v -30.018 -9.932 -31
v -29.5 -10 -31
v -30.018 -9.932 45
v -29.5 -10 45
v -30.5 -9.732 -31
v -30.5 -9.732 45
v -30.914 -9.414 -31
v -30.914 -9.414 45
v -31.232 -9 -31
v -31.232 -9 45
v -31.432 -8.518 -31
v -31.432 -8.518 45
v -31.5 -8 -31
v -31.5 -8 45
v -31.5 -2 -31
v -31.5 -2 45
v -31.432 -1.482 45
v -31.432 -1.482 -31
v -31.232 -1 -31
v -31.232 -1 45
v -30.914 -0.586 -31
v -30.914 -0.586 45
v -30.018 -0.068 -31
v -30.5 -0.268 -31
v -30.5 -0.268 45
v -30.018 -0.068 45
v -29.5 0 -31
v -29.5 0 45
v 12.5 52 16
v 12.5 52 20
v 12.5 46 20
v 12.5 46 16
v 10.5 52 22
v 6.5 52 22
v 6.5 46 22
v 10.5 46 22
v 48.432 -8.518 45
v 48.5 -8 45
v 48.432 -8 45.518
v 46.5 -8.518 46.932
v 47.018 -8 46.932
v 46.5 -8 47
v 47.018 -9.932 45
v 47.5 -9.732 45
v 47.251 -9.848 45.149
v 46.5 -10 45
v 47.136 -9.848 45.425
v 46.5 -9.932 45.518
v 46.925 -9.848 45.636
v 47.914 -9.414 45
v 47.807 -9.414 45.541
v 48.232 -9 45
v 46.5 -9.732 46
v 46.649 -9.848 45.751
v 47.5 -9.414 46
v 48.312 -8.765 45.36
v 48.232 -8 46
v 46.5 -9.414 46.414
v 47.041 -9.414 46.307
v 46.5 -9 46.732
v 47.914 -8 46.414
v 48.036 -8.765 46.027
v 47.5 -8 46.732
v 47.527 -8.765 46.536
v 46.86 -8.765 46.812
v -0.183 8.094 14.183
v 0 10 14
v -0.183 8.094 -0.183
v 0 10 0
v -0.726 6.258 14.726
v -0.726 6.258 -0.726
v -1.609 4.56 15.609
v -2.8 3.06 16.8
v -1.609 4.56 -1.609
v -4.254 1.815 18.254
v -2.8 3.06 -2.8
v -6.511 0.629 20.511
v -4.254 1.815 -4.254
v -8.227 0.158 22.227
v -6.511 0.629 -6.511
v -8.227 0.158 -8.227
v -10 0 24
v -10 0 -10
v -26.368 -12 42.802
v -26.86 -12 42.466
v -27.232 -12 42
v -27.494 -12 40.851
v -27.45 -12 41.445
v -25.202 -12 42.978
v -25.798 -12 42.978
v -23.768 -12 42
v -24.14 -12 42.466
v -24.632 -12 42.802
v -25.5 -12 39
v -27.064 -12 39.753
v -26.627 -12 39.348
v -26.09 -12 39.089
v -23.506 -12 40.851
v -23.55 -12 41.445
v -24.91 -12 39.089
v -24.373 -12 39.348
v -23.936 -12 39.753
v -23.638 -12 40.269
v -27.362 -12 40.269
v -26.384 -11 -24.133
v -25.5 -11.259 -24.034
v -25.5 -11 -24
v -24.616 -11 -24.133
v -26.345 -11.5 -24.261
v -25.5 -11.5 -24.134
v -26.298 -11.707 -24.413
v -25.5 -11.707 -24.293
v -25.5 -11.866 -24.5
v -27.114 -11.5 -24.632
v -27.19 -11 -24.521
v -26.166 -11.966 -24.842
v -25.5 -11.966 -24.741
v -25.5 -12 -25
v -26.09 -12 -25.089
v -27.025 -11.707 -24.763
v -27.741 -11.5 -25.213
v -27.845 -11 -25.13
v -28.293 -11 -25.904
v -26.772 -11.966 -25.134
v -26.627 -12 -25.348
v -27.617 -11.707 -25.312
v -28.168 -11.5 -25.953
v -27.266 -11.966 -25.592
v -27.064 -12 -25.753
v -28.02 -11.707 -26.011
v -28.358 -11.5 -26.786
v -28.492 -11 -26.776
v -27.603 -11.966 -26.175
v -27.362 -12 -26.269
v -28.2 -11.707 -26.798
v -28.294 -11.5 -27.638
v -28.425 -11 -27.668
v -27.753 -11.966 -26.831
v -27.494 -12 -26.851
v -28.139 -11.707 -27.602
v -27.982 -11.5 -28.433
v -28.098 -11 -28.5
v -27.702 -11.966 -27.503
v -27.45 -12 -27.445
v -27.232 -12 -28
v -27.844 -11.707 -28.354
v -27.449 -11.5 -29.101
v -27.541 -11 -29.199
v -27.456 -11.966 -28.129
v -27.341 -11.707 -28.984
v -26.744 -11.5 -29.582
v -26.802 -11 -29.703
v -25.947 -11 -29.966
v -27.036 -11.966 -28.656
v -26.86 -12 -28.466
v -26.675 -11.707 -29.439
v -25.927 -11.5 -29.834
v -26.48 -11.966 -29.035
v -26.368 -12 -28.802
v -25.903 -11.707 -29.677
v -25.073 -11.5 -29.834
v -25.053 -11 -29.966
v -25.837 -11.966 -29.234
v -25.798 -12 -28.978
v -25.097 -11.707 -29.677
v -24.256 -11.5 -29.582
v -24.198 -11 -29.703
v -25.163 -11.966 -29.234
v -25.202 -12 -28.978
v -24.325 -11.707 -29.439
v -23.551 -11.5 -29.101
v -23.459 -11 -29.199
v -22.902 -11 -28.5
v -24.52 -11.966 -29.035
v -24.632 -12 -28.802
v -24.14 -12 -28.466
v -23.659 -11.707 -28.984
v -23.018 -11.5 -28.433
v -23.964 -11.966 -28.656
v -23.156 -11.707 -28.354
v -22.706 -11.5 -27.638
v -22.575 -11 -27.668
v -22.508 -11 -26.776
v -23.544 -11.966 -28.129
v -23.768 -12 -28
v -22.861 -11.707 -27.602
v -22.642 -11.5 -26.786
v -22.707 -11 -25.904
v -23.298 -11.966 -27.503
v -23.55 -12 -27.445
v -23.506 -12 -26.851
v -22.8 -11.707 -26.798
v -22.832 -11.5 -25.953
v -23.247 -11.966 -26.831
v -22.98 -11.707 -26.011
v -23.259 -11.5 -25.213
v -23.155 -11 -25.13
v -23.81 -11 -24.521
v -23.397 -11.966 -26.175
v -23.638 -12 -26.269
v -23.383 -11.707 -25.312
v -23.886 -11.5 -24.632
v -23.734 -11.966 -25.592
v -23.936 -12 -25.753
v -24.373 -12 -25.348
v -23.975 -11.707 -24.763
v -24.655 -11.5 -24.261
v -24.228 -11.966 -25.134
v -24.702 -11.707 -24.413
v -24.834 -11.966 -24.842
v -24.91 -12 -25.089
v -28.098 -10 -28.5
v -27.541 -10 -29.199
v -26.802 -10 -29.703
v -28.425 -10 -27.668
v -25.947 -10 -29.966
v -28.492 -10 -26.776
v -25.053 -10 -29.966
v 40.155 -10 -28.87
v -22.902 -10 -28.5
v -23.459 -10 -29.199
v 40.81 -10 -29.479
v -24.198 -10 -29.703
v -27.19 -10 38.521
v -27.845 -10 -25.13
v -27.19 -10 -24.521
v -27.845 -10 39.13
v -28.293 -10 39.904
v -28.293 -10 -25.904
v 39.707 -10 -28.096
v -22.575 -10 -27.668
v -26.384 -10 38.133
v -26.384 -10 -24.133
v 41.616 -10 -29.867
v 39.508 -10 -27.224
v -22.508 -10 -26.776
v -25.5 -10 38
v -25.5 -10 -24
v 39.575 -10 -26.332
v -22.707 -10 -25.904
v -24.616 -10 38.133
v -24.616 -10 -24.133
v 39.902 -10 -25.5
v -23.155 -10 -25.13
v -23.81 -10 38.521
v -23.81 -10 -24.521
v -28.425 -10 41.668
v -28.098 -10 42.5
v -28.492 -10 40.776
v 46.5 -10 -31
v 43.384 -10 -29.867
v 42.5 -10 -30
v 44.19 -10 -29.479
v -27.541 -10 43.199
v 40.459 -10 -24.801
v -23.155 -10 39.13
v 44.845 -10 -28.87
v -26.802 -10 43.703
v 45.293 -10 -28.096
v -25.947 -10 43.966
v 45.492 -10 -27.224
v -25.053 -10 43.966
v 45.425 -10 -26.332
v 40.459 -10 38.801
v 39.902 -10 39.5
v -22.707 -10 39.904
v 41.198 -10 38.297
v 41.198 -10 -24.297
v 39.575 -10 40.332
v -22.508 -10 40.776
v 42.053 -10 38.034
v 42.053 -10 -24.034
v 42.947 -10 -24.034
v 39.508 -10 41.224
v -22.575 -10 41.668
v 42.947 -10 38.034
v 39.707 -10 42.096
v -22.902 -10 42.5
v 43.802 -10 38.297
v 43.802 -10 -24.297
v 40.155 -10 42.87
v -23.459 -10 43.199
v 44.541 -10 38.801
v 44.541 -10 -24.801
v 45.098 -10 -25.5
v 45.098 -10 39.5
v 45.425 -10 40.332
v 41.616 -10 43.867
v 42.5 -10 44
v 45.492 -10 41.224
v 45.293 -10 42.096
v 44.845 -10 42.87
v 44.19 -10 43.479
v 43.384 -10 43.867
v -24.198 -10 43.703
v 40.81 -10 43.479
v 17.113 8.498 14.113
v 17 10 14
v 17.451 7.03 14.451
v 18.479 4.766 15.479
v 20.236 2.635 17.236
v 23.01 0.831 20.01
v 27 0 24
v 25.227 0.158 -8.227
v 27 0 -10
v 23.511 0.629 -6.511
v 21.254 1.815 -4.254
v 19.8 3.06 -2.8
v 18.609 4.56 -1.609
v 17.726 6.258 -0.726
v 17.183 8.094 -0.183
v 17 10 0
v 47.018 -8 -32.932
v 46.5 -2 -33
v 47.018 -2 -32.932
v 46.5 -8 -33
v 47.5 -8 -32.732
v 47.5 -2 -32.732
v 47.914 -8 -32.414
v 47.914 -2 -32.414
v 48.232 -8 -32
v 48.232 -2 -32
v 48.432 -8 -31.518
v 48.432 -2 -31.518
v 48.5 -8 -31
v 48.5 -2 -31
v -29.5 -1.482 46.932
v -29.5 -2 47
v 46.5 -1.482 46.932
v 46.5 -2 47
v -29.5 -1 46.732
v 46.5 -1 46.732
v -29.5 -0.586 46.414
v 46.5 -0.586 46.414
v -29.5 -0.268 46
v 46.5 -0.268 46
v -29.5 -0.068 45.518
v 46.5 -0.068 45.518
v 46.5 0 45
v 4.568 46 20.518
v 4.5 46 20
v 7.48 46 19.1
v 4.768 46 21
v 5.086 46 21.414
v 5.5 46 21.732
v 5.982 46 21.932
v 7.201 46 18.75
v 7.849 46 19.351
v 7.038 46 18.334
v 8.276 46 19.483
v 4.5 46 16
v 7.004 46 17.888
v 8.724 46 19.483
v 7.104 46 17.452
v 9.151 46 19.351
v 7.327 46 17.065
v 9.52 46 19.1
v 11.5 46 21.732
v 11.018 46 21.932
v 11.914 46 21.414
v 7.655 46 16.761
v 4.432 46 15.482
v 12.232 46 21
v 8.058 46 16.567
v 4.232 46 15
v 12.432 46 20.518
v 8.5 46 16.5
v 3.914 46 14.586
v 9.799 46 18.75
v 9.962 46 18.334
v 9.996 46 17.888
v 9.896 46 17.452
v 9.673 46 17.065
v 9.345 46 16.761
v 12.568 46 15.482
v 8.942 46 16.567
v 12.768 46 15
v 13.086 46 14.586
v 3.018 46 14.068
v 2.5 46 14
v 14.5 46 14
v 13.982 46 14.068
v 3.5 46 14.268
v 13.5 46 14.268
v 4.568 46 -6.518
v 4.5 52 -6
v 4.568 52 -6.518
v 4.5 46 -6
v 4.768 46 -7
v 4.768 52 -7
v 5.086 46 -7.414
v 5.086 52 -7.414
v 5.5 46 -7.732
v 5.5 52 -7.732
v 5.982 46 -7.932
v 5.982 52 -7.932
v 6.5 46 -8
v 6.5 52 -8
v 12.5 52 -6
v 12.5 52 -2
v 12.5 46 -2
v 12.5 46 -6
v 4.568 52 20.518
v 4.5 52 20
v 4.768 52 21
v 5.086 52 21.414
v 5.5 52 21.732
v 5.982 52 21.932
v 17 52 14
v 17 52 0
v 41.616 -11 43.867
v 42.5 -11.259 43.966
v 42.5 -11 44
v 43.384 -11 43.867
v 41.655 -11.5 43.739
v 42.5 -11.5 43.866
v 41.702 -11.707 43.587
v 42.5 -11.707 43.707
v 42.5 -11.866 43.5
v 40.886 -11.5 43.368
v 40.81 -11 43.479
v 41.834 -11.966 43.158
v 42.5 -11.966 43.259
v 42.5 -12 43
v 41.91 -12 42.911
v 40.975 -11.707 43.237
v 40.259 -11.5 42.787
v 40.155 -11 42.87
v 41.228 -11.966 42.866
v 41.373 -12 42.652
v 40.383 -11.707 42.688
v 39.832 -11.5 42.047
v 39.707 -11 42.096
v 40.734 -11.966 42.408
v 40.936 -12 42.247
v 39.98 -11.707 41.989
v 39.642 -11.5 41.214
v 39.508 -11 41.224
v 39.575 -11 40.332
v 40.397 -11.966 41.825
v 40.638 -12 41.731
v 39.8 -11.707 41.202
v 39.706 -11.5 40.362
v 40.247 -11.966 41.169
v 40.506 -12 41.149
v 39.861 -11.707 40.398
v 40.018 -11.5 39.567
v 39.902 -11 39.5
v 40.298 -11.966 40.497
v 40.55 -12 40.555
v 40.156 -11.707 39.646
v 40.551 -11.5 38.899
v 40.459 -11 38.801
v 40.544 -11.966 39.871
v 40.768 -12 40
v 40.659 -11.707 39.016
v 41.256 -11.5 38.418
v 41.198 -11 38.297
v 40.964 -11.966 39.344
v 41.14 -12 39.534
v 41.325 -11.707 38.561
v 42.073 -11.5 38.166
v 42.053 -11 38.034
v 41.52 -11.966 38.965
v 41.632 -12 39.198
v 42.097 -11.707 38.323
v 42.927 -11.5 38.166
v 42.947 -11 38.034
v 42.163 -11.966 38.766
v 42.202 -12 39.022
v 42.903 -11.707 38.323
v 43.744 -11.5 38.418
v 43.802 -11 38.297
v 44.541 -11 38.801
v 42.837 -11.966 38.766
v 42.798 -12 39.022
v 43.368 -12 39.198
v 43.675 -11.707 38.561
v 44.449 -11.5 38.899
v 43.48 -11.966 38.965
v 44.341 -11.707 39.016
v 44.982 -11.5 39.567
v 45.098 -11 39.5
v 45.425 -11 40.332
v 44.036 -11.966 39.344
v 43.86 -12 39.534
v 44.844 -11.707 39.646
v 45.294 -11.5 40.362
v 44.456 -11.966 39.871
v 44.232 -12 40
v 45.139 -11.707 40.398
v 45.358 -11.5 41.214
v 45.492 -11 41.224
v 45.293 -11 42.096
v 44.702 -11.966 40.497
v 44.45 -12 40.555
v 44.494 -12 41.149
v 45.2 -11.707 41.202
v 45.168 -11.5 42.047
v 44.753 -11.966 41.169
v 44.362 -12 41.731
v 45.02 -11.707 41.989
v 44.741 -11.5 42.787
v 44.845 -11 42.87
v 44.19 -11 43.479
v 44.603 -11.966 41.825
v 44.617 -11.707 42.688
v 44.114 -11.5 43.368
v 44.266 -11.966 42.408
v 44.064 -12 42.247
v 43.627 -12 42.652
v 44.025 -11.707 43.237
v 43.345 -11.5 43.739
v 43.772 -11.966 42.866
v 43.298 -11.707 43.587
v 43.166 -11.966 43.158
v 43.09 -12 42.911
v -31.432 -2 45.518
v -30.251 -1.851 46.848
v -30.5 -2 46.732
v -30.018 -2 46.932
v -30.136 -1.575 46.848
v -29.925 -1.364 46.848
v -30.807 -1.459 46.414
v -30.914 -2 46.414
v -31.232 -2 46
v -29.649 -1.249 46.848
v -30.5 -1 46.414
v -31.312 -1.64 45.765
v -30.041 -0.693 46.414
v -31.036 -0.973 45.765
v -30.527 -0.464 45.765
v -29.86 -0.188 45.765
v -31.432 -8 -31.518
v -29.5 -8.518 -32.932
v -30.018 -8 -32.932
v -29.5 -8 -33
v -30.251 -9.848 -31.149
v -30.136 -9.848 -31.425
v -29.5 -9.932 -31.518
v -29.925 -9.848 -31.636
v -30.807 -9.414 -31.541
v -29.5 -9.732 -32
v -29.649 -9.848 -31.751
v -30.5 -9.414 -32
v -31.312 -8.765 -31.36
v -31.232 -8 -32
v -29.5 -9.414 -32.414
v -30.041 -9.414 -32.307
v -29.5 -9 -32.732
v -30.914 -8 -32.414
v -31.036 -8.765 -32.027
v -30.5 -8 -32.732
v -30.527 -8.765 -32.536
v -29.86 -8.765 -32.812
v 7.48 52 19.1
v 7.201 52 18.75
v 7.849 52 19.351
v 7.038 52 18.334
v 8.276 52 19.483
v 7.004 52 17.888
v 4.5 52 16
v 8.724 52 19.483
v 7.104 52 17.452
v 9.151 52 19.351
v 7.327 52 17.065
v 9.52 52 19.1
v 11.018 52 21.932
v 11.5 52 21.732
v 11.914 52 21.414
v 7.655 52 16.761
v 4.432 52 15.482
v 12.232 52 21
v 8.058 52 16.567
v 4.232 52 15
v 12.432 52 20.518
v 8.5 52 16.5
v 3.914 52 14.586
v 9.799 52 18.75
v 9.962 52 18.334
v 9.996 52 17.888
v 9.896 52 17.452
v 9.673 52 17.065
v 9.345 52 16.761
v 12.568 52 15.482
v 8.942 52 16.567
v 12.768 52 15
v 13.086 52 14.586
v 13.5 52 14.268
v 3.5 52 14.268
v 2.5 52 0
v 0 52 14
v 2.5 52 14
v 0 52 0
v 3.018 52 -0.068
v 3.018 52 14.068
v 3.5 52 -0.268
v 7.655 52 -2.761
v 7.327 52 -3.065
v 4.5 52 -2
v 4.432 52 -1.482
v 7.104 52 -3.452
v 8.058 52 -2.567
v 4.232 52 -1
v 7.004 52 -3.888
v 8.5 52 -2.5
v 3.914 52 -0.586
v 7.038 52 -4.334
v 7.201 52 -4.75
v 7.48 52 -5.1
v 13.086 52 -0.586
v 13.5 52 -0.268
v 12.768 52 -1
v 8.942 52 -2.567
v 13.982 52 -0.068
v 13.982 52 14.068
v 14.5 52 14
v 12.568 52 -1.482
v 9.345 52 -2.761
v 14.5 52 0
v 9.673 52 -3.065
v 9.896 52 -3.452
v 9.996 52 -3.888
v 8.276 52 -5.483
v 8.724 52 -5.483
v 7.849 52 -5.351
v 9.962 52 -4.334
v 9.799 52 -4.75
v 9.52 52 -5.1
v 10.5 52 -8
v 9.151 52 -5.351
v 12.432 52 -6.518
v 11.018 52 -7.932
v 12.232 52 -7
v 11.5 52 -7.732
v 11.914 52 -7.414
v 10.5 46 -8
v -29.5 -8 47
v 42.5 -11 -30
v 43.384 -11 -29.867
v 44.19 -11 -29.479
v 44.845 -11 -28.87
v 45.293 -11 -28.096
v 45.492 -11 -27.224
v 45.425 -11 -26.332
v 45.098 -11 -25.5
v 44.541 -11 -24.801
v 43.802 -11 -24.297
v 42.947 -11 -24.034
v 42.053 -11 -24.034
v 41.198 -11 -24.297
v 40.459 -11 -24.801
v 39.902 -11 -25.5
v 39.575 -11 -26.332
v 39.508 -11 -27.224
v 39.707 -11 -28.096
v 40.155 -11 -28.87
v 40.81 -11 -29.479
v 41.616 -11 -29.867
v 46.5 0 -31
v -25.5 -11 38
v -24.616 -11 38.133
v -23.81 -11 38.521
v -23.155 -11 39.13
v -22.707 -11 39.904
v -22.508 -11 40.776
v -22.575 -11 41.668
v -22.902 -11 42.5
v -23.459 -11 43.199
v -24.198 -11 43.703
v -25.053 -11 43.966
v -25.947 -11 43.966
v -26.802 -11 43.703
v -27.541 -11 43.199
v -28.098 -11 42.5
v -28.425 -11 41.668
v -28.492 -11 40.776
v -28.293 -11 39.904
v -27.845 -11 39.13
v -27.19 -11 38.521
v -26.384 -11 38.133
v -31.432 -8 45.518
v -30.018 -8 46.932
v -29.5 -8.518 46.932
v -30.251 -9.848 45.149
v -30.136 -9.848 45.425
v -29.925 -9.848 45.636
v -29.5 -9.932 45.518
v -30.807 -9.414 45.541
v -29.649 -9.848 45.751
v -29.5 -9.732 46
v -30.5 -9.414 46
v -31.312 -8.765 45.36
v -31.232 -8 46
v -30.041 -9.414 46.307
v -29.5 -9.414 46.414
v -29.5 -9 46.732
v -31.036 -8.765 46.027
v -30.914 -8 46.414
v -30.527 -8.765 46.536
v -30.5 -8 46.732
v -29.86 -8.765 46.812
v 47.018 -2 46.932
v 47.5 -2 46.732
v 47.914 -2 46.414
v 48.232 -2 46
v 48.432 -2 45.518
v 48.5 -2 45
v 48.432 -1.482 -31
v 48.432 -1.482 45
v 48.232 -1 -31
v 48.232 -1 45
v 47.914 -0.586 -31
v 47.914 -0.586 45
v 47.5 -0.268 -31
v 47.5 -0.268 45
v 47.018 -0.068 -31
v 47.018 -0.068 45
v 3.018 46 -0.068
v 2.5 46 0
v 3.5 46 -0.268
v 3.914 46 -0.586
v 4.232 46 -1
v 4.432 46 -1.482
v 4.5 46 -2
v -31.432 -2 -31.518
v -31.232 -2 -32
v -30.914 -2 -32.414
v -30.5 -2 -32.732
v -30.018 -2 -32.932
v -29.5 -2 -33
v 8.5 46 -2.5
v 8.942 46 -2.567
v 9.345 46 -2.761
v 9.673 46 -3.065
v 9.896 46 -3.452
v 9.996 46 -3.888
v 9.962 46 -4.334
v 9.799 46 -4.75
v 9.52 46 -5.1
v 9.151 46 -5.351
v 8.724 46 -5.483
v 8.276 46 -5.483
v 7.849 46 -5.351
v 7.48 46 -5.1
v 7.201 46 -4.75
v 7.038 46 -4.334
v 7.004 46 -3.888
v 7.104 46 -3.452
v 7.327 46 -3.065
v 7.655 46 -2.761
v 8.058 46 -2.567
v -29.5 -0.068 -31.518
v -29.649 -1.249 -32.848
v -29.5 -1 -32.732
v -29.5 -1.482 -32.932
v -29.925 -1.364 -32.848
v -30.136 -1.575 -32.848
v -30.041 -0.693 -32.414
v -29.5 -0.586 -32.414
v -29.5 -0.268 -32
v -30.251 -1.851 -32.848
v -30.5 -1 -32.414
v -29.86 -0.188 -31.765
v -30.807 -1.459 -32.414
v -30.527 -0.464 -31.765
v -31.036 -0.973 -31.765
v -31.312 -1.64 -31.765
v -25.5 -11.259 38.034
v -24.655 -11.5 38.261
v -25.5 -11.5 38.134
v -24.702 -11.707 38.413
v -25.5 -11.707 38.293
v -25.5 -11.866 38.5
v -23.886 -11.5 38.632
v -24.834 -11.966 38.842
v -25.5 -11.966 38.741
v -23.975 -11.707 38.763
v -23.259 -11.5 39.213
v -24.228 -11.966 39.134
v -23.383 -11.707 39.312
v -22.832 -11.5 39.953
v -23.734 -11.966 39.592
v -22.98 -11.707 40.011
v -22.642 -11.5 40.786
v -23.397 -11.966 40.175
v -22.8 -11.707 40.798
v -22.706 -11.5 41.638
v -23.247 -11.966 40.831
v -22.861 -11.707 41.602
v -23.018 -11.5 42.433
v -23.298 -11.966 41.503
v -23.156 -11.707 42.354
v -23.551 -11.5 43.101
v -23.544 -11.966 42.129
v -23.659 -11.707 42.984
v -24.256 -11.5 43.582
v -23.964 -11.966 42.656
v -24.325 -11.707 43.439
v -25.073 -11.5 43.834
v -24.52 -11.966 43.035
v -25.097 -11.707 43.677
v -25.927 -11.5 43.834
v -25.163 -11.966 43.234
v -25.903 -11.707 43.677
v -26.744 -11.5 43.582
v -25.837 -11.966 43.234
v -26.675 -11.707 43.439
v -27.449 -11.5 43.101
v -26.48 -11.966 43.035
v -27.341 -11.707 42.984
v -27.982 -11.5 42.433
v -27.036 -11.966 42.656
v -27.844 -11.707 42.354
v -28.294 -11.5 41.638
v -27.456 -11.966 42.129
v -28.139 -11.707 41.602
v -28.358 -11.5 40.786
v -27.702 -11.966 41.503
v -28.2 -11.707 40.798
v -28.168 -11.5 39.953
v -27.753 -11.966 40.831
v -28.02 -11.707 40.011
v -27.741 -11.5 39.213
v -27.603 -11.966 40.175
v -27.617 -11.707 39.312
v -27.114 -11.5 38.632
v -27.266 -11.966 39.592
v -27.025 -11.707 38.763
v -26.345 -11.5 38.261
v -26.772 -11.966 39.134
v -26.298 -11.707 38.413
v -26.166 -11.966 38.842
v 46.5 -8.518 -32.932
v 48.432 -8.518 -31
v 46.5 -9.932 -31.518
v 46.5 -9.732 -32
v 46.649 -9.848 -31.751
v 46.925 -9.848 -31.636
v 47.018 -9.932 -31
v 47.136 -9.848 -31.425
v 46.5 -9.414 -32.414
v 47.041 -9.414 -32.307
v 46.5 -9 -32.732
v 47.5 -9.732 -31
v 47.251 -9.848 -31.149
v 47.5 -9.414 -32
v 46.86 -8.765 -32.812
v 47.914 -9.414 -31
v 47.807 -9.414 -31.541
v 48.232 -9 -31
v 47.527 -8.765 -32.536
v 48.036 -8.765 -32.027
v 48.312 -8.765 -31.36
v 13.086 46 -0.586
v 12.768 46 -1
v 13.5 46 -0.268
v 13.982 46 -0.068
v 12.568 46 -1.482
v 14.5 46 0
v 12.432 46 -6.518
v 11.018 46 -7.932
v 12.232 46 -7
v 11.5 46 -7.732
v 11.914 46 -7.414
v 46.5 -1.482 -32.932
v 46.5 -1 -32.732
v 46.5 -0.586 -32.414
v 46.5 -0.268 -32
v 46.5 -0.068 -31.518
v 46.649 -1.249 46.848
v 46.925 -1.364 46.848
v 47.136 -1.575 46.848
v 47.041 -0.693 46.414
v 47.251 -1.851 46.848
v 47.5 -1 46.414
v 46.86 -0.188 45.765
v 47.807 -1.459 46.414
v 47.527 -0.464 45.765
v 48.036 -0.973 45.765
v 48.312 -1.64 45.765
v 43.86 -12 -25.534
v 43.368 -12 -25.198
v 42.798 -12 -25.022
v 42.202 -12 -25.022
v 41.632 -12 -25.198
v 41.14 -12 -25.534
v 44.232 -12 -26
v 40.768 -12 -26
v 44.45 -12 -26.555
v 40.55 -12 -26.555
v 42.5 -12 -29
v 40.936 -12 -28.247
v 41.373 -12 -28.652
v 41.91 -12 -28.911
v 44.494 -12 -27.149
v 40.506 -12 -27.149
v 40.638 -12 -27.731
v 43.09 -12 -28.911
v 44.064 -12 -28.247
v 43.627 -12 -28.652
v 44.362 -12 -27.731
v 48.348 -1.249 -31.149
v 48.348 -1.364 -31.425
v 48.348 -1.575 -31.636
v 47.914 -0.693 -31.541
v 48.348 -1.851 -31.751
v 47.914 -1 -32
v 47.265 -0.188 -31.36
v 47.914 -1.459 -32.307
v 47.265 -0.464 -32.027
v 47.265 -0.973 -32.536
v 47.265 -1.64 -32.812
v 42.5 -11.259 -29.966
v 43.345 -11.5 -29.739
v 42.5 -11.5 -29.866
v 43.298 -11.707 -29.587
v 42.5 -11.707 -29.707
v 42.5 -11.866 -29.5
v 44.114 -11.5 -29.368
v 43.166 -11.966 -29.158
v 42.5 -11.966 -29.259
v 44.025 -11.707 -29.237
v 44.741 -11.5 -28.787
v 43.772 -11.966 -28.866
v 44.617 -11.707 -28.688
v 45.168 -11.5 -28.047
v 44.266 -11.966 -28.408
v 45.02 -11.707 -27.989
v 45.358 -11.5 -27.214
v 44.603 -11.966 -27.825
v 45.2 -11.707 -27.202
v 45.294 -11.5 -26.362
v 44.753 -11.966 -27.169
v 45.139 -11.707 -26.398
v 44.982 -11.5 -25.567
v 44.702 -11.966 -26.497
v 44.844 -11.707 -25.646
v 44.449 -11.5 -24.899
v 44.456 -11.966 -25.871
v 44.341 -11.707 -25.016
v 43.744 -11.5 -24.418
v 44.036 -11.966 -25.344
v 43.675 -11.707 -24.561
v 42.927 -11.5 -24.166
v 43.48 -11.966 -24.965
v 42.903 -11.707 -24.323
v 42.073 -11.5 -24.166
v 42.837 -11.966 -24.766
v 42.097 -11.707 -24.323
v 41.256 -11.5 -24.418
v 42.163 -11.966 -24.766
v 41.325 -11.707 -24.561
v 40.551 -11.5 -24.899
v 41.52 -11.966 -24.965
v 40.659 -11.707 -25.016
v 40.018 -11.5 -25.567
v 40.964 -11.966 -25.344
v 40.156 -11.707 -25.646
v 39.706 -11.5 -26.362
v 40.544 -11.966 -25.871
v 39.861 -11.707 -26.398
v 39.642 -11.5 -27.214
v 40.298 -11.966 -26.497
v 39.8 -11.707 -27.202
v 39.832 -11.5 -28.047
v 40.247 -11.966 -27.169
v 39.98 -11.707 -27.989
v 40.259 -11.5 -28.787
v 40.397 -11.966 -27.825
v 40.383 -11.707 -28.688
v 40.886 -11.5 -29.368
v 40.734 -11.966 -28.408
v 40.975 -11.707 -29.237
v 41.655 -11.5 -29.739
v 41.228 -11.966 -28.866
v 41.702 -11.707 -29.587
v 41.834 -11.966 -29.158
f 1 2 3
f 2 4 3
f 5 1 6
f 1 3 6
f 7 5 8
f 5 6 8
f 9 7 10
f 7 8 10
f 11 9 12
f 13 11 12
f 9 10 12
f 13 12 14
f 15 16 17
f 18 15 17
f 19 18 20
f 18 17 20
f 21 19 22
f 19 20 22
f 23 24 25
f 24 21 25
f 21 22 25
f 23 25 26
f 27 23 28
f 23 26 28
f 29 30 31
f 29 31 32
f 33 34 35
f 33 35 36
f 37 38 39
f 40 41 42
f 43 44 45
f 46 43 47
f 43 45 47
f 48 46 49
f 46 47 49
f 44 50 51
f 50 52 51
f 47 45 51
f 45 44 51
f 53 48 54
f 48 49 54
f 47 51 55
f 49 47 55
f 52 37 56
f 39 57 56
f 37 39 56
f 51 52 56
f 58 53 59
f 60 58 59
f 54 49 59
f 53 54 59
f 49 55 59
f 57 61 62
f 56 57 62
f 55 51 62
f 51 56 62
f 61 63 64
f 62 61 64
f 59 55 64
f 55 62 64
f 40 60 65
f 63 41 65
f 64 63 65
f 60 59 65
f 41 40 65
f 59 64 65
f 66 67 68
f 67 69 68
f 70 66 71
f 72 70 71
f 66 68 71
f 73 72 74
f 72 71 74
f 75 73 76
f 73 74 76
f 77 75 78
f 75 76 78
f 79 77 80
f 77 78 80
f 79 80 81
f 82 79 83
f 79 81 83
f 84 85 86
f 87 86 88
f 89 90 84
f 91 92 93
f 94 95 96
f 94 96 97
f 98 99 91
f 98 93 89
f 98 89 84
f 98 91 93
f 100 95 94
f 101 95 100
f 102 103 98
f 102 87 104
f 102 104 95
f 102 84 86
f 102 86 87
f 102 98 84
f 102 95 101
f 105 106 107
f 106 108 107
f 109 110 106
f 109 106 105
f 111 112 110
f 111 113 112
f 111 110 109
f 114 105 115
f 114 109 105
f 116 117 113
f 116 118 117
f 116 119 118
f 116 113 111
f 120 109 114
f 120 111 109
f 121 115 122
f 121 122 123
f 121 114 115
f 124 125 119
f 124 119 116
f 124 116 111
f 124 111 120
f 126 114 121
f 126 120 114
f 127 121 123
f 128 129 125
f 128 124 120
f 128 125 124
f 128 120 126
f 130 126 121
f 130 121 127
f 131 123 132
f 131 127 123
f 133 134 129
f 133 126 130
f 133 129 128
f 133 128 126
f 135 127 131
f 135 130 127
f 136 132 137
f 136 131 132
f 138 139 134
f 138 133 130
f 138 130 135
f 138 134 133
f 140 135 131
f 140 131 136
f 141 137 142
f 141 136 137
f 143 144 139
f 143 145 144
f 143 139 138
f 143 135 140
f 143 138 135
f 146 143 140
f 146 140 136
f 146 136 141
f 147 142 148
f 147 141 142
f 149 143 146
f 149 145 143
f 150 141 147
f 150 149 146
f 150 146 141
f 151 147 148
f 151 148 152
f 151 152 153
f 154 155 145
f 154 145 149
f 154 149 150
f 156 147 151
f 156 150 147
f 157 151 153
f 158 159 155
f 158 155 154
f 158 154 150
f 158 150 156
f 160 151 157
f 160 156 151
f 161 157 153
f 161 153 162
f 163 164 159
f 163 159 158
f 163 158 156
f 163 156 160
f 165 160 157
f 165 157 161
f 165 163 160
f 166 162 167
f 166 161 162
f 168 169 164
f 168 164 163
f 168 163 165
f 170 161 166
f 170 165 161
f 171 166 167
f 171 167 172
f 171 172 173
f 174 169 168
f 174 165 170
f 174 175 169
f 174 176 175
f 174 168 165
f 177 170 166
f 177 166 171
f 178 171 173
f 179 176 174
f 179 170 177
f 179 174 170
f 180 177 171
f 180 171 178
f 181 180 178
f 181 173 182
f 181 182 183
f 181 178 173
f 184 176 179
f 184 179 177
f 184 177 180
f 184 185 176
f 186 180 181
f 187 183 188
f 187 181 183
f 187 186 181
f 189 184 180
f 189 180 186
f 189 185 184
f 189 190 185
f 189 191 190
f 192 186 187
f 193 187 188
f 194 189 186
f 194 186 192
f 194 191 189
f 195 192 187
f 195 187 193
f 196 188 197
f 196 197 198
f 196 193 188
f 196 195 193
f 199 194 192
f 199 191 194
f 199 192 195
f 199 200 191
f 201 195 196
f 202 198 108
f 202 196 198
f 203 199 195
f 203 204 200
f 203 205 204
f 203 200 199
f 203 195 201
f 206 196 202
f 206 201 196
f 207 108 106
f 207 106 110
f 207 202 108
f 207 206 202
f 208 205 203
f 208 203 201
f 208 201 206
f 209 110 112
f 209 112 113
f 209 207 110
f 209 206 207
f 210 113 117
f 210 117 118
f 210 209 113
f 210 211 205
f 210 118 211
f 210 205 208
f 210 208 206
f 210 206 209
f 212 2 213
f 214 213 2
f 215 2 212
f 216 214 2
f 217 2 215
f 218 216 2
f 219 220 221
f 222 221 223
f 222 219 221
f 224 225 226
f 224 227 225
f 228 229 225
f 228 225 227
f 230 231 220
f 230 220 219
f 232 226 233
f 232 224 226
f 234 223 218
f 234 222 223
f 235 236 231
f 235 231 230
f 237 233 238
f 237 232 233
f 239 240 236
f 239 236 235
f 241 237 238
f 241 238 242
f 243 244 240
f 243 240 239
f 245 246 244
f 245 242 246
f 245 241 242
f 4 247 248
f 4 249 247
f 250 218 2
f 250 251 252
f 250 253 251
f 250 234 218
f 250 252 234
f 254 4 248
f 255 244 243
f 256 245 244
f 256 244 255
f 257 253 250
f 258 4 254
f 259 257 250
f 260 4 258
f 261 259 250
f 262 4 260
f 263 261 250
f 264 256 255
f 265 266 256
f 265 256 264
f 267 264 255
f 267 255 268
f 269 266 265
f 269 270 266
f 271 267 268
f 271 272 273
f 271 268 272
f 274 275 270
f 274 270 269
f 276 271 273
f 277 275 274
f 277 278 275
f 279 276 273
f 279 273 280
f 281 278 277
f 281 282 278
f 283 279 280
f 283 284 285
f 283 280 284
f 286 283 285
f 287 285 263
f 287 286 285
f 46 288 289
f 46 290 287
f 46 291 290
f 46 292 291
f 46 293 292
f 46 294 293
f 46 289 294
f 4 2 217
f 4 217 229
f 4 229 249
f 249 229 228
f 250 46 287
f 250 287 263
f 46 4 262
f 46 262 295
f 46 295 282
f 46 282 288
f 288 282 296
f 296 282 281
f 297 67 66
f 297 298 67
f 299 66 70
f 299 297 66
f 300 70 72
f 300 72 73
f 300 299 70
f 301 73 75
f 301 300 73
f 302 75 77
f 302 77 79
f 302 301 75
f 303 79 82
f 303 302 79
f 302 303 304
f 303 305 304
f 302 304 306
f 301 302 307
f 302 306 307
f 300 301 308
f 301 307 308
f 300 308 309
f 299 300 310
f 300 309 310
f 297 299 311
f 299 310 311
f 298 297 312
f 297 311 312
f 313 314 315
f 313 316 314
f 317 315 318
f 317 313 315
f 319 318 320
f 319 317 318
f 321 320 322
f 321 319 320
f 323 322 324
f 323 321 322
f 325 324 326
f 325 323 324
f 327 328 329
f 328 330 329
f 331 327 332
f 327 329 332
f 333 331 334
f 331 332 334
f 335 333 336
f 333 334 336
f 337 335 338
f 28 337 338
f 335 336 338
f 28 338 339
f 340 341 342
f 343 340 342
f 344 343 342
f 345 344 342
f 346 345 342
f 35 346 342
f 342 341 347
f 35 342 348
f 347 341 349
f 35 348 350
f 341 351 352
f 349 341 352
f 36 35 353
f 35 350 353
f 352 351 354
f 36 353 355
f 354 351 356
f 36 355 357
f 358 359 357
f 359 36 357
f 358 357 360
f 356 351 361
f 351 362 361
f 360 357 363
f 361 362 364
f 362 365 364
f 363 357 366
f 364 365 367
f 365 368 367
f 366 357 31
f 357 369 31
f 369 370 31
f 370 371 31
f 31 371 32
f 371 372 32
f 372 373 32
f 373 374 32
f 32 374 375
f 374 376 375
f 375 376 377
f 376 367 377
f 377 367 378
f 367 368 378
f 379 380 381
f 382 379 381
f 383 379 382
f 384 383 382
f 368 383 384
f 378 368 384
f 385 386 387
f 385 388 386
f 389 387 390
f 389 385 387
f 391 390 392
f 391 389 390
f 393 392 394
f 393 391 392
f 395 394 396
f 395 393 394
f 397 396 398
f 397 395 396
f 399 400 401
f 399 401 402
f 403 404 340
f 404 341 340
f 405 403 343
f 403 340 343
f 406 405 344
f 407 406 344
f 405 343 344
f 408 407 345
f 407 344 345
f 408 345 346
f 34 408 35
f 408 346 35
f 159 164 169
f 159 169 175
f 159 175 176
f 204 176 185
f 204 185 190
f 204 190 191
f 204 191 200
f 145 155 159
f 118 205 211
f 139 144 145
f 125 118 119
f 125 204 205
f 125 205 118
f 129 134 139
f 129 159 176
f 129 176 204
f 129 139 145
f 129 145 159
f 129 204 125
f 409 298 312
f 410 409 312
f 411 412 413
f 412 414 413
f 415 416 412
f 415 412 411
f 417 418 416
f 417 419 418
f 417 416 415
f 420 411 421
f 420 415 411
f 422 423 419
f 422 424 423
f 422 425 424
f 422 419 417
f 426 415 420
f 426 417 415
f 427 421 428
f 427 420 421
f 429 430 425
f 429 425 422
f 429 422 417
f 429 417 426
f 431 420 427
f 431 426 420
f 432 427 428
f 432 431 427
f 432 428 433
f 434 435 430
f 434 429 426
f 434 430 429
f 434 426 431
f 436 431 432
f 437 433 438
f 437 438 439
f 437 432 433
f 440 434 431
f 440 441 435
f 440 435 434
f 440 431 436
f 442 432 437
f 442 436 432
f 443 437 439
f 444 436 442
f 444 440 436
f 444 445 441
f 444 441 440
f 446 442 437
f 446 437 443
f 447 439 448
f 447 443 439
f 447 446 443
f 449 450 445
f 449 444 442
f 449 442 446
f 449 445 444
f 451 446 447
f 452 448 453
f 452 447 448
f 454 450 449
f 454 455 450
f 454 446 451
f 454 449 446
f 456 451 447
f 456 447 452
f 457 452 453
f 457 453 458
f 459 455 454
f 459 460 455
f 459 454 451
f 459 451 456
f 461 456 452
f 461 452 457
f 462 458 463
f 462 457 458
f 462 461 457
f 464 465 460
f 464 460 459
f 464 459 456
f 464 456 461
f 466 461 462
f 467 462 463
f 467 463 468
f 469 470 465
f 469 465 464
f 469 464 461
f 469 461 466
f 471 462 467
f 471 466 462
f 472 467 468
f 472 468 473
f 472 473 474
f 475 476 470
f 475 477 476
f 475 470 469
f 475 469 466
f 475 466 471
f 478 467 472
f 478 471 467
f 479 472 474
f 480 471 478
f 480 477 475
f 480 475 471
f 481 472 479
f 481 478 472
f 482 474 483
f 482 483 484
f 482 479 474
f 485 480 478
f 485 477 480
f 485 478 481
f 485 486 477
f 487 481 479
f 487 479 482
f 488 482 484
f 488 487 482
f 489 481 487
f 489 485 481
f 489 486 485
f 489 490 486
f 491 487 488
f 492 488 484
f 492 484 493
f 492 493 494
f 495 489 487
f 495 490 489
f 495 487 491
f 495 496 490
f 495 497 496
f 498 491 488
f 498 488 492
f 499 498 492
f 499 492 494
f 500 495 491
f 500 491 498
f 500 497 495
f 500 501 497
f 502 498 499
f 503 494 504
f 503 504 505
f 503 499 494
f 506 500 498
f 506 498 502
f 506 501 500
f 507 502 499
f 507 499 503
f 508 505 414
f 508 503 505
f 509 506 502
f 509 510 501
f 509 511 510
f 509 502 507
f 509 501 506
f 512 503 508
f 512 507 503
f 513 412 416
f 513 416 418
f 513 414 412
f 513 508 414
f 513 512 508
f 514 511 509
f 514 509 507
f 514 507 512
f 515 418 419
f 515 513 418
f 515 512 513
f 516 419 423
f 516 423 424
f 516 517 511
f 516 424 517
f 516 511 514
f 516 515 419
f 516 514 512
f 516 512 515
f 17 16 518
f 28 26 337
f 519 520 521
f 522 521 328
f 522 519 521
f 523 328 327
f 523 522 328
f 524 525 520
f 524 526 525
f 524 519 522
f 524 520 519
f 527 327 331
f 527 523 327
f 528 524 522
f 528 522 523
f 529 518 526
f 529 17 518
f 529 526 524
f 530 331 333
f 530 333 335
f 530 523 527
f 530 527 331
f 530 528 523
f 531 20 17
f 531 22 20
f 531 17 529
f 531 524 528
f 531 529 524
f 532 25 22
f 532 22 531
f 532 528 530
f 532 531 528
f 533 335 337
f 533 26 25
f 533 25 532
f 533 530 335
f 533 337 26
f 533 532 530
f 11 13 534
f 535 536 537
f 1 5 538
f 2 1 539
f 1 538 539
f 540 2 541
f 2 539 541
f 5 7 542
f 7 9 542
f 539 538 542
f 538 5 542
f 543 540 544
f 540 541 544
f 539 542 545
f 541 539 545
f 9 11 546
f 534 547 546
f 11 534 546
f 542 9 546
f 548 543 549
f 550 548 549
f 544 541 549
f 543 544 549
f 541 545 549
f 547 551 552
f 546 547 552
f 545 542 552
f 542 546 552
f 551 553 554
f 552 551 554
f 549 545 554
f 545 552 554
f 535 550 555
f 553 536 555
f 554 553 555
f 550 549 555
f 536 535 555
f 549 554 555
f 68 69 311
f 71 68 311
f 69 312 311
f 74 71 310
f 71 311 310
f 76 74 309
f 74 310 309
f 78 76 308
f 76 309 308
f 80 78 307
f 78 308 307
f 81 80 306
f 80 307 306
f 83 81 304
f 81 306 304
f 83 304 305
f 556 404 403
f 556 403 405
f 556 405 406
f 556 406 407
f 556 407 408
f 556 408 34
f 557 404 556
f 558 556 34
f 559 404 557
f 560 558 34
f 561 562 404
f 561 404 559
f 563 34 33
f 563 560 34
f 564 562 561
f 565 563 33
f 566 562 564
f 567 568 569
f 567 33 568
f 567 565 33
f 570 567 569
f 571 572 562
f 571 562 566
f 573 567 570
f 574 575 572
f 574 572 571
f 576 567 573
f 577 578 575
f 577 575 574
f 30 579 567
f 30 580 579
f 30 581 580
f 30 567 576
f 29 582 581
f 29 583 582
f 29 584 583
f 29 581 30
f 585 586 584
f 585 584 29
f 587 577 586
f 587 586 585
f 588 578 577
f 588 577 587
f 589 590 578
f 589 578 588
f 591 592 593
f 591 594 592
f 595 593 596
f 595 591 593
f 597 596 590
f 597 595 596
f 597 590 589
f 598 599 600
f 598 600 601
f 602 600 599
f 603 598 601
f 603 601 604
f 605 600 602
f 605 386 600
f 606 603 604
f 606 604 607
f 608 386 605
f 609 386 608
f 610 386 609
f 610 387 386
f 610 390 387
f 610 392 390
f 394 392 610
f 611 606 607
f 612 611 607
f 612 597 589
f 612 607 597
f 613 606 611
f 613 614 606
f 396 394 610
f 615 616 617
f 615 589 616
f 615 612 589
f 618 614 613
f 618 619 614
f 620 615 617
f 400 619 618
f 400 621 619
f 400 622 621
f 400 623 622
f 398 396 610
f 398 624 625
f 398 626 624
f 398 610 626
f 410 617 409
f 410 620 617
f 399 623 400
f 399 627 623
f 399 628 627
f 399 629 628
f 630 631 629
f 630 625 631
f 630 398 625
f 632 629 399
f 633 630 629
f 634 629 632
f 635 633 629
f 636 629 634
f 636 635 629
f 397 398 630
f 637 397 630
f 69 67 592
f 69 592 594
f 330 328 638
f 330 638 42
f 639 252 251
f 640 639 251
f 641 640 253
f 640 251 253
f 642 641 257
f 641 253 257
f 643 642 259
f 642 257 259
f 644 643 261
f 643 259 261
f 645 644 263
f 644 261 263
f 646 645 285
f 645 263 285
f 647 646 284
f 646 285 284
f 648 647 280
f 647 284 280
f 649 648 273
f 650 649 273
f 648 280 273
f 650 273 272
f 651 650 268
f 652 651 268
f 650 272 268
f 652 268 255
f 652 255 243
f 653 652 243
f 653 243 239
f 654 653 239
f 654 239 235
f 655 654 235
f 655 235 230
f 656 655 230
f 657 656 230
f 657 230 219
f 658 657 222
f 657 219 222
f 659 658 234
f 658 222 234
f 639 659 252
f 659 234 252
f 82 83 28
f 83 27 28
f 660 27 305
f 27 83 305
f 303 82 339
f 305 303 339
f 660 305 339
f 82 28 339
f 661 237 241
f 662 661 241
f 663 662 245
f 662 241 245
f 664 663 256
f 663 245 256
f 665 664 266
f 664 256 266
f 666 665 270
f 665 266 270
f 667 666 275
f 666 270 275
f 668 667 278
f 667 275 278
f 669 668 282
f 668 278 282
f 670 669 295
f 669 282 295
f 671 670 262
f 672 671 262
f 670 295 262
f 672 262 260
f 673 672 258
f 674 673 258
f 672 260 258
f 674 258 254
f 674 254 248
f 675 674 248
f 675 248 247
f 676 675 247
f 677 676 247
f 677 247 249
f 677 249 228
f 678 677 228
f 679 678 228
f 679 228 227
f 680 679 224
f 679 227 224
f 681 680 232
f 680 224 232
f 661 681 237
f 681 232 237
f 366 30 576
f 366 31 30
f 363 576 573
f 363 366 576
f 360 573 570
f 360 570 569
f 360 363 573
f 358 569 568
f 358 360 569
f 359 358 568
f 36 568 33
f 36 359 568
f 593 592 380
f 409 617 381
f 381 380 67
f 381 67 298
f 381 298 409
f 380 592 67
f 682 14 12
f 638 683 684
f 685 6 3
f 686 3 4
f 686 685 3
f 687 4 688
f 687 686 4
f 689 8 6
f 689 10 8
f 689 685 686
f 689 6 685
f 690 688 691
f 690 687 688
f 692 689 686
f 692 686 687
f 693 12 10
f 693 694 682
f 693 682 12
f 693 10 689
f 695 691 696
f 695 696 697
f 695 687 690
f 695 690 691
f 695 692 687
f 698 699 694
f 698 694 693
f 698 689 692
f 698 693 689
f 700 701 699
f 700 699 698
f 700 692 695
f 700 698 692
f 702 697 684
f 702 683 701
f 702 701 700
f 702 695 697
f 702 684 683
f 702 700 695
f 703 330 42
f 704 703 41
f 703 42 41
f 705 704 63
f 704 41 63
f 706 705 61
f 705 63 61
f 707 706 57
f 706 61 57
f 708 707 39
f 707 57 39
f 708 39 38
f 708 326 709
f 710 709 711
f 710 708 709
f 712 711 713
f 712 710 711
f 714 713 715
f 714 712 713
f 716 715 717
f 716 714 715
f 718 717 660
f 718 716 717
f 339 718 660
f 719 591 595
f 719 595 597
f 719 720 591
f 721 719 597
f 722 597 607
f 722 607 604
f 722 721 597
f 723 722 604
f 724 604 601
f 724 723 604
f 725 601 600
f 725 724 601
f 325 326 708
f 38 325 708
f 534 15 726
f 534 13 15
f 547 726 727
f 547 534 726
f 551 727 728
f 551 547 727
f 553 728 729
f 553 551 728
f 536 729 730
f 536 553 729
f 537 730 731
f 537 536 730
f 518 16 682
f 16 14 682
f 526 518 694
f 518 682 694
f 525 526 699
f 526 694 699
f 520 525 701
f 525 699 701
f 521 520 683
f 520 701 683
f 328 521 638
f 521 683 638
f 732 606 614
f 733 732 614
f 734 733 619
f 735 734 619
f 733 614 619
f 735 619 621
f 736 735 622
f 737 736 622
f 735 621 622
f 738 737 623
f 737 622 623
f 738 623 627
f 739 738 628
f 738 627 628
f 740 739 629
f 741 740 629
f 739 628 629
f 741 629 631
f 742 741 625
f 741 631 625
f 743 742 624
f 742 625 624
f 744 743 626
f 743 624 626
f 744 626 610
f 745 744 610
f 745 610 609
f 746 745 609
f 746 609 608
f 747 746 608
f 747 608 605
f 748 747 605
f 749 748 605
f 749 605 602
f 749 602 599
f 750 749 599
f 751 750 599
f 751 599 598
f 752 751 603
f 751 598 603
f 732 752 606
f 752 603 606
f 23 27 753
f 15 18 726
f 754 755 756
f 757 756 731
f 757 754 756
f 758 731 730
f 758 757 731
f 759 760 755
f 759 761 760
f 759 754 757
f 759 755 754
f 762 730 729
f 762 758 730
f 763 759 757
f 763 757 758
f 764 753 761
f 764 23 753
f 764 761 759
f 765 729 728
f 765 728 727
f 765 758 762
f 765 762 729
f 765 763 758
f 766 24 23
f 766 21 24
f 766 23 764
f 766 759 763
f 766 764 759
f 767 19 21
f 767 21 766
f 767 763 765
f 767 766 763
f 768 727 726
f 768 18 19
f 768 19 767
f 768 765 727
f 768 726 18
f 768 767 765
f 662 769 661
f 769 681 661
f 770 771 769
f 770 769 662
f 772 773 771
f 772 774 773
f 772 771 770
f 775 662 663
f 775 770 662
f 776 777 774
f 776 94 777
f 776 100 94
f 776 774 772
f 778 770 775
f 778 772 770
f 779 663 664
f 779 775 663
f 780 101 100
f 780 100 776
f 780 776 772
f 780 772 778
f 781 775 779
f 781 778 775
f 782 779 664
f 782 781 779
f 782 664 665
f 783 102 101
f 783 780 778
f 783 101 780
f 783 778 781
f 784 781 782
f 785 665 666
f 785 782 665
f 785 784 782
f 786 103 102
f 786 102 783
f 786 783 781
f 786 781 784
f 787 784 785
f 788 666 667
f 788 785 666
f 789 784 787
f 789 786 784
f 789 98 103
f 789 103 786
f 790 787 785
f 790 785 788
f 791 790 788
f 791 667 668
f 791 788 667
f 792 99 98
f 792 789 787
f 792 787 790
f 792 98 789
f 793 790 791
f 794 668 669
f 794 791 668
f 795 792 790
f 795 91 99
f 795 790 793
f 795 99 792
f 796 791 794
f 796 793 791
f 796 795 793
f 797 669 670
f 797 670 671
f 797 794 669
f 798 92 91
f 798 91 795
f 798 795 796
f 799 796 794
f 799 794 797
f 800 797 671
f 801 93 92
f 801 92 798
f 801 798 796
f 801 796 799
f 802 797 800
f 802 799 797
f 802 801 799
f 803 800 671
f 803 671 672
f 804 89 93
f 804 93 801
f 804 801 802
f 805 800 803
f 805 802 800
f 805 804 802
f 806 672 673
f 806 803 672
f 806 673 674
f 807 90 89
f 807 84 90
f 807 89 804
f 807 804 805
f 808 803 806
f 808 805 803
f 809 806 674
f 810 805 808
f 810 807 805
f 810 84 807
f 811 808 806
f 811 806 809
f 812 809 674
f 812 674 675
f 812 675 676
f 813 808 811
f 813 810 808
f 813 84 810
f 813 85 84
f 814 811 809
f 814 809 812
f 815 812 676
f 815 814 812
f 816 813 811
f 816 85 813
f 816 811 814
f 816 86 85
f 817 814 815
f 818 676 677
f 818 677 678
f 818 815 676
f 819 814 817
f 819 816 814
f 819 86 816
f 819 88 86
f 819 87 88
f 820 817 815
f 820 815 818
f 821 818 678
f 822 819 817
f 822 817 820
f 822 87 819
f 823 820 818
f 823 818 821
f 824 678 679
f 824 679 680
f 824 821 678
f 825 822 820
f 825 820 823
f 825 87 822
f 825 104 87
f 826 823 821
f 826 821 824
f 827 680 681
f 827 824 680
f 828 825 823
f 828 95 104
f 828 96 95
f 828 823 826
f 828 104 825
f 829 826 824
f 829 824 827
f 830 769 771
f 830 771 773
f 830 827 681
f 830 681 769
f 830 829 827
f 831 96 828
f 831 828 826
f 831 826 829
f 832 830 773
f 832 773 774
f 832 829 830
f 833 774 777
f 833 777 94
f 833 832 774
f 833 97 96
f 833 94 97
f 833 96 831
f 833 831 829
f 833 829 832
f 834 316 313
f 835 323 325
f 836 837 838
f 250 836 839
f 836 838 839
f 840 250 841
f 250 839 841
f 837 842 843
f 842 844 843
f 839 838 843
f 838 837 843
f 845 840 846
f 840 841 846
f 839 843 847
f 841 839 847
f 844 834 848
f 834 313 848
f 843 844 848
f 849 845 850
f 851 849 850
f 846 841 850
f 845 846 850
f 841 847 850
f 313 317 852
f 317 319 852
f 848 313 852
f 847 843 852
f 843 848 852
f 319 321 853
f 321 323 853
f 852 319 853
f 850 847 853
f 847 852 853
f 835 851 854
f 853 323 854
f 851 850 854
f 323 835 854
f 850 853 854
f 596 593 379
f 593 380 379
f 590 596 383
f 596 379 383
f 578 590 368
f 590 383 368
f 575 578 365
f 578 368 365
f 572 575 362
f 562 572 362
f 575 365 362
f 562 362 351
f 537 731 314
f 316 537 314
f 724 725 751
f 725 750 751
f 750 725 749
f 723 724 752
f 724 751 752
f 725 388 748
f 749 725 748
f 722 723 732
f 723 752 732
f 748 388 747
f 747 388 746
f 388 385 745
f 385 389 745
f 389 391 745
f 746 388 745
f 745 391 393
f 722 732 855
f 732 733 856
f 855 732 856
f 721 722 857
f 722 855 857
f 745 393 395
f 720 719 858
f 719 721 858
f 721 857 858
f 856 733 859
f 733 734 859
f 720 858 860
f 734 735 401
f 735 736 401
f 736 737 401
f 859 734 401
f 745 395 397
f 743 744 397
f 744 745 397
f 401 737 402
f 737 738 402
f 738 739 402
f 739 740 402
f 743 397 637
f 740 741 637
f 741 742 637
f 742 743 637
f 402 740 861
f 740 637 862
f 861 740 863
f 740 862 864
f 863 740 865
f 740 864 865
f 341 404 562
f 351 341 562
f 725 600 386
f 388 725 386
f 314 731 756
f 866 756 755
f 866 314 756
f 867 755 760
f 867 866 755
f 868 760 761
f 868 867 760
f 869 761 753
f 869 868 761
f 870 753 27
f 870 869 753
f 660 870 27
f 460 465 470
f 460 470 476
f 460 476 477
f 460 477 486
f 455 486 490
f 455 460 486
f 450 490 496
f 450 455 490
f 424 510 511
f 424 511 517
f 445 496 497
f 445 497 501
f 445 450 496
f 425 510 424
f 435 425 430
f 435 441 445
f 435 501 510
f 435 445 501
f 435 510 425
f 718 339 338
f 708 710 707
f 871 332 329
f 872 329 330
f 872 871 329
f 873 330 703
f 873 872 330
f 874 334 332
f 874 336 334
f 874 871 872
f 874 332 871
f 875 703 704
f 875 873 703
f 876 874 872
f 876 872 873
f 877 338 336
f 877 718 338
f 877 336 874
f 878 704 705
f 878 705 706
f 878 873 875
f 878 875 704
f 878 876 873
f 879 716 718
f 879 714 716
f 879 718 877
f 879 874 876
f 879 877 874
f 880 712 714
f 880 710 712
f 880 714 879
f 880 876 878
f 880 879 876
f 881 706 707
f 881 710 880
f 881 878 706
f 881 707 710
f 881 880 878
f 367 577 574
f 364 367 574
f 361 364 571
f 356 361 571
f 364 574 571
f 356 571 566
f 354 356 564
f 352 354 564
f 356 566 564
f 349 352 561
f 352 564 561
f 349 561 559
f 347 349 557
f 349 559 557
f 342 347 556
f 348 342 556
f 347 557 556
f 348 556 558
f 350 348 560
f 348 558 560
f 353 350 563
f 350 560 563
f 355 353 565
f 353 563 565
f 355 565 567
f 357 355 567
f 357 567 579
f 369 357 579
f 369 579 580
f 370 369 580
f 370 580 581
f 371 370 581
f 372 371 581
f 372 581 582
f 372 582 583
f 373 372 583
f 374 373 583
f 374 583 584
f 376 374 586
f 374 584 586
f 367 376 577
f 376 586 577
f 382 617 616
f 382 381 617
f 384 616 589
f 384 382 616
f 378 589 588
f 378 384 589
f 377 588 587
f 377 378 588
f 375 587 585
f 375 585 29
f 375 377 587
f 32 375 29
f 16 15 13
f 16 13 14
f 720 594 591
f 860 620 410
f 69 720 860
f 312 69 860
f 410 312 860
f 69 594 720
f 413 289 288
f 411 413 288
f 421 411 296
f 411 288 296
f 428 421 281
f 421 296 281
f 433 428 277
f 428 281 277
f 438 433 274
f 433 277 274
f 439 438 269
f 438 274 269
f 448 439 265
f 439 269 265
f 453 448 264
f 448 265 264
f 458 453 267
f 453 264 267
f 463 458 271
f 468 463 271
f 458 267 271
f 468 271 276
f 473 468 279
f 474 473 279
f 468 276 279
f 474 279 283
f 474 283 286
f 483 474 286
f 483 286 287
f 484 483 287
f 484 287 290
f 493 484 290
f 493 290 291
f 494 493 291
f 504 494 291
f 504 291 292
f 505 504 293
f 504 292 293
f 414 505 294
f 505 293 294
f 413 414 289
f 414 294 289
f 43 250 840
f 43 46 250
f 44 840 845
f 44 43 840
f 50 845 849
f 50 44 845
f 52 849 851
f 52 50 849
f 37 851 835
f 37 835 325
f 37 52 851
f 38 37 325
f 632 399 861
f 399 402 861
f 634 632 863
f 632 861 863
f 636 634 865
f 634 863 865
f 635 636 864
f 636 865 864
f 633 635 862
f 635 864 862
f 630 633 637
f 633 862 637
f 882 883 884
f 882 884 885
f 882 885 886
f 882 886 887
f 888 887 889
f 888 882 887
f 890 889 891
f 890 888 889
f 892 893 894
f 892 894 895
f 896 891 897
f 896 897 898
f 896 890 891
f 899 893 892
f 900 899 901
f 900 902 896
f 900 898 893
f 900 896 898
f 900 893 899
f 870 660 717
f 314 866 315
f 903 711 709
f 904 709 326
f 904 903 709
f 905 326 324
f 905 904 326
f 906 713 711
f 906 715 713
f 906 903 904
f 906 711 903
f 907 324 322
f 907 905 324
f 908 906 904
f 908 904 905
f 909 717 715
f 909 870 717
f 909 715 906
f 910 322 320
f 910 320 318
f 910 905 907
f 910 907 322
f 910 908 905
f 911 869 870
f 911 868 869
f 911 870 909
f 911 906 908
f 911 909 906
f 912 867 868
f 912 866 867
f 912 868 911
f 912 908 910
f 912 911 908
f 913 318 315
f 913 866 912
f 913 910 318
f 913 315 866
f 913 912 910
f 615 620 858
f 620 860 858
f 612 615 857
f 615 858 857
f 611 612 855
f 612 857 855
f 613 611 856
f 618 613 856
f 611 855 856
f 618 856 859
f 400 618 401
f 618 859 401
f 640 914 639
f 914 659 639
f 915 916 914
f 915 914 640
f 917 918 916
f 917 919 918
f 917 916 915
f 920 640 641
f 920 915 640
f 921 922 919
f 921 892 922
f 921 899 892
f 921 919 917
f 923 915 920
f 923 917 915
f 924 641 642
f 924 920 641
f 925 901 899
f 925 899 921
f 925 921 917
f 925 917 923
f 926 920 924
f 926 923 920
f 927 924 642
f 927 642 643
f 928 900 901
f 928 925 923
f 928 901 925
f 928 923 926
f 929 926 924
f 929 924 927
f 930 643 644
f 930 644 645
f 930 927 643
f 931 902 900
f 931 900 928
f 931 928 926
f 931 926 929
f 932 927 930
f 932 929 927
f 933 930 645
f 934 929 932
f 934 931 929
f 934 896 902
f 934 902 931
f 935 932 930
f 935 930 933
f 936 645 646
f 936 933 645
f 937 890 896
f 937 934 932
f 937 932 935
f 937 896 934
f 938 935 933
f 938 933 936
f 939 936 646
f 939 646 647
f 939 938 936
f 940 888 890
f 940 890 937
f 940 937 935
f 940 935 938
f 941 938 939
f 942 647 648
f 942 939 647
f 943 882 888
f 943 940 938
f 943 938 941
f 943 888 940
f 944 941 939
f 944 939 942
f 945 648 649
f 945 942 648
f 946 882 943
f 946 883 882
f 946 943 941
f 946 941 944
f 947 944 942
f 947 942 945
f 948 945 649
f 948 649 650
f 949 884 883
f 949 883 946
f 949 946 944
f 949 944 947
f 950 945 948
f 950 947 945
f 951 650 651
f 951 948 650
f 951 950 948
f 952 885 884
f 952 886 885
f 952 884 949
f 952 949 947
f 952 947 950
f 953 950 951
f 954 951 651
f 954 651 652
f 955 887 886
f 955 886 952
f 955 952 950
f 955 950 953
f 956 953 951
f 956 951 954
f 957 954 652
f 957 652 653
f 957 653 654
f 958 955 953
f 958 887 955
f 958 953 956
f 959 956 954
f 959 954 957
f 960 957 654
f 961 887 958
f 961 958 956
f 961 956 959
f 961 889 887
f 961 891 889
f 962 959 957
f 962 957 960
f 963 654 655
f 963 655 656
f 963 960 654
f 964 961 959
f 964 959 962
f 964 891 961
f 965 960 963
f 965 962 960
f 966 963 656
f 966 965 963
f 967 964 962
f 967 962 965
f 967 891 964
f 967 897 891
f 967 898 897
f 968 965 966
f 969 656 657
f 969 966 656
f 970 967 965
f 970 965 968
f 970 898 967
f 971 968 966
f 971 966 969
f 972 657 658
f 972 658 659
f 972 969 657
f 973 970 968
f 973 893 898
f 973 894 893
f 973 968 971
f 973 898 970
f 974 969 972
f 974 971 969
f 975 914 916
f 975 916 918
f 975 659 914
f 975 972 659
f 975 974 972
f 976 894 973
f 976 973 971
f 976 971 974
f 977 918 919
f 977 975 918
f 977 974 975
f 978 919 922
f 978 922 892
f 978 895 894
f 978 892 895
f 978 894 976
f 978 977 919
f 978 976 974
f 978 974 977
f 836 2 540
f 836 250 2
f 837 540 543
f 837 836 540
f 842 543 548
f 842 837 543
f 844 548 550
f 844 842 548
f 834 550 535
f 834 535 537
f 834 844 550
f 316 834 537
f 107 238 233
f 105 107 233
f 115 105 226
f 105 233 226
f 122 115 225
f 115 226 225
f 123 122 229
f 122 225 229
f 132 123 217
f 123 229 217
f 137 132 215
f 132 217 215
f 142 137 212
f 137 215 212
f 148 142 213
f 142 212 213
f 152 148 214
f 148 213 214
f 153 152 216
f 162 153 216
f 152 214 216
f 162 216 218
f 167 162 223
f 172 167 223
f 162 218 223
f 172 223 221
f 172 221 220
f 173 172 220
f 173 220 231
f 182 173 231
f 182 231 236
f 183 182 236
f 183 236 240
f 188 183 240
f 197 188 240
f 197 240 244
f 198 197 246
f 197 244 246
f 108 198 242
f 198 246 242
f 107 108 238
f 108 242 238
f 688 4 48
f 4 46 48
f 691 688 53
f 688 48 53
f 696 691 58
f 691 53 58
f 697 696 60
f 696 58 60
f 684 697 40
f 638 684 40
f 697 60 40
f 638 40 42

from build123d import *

# Parameters (mm, degrees)
SKETCH1_W           = 17
SKETCH1_H           = 14
BOSS_EXTRUDE1_DEPTH = 52
SKETCH2_W           = 80
SKETCH2_H           = 80
BOSS_EXTRUDE2_DEPTH = 10
SKETCH3_W           = 8
SKETCH3_H           = 8
SKETCH3_R           = 1.5
BOSS_EXTRUDE3_DEPTH = 6
FILLET1_R           = 2
FILLET2_R           = 10
SKETCH4_R           = 3
BOSS_EXTRUDE4_DEPTH = 2
FILLET4_R           = 1
FILLET3_R           = 2


with BuildPart() as part:
    # Sketch1 → Boss-Extrude1 (new body)
    with BuildSketch(Plane(origin=(0, 0, 0), x_dir=(1, 0, 0), z_dir=(0, 1, 0))):
        with Locations((8.5, -7)):
            Rectangle(SKETCH1_W, SKETCH1_H)
    extrude(amount=BOSS_EXTRUDE1_DEPTH)

    # Sketch2 → Boss-Extrude2 (add)
    with BuildSketch(Plane.XZ):
        with Locations((8.5, 7)):
            Rectangle(SKETCH2_W, SKETCH2_H)
    extrude(amount=BOSS_EXTRUDE2_DEPTH)

    # Sketch3 → Boss-Extrude3 (add)
    # profile 1 of 2: a face of its own
    with BuildSketch(Plane(origin=(0, 52, 0), x_dir=(1, 0, 0), z_dir=(0, 1, 0))):
        with Locations((8.5, 4)):
            Rectangle(SKETCH3_W, SKETCH3_H)
        with Locations(Location((8.5, 4, 0), (0, 0, 270))):
            Circle(SKETCH3_R, mode=Mode.SUBTRACT)
    # profile 2 of 2: a face of its own
    with BuildSketch(Plane(origin=(0, 52, 0), x_dir=(1, 0, 0), z_dir=(0, 1, 0))):
        with Locations((8.5, -18)):
            Rectangle(SKETCH3_W, SKETCH3_H)
        with Locations(Location((8.5, -18, 0), (0, 0, 90))):
            Circle(SKETCH3_R, mode=Mode.SUBTRACT)
    extrude(amount=-BOSS_EXTRUDE3_DEPTH)

    # Fillet1
    fillet1_edges = [part.edges().sort_by_distance(p)[0] for p in [
        (4.5, 49, 0),
        (4.5, 49, -8),
        (12.5, 49, -8),
        (12.5, 49, 0),
        (4.5, 49, 22),
        (4.5, 49, 14),
        (12.5, 49, 14),
        (12.5, 49, 22),
    ]]
    fillet(fillet1_edges, radius=FILLET1_R)

    # Fillet2
    fillet2_edges = [part.edges().sort_by_distance(p)[0] for p in [
        (8.5, 0, 0),
        (17, 0, 7),
        (8.5, 0, 14),
        (0, 0, 7),
    ]]
    fillet(fillet2_edges, radius=FILLET2_R)

    # Sketch4 → Boss-Extrude4 (add)
    with BuildSketch(Plane.XZ.offset(10)):
        with Locations(Location((-25.5, 41, 0), (0, 0, 270))):
            Circle(SKETCH4_R)
        with Locations(Location((-25.5, -27, 0), (0, 0, 90))):
            Circle(SKETCH4_R)
        with Locations(Location((42.5, -27, 0), (0, 0, 270))):
            Circle(SKETCH4_R)
        with Locations(Location((42.5, 41, 0), (0, 0, 90))):
            Circle(SKETCH4_R)
    extrude(amount=BOSS_EXTRUDE4_DEPTH)

    # Fillet4
    fillet4_edges = [part.edges().sort_by_distance(p)[0] for p in [
        (-25.5, -12, 44),
        (-25.5, -12, -30),
        (42.5, -12, -24),
        (42.5, -12, 38),
    ]]
    fillet(fillet4_edges, radius=FILLET4_R)

    # Fillet3
    fillet3_edges = [part.edges().sort_by_distance(p)[0] for p in [
        (-31.5, 0, 7),
        (-31.5, -5, 47),
        (8.5, 0, -33),
        (-31.5, -5, -33),
        (48.5, 0, 7),
        (48.5, -5, -33),
        (8.5, 0, 47),
        (48.5, -5, 47),
        (-31.5, -10, 7),
        (8.5, -10, -33),
        (48.5, -10, 7),
        (8.5, -10, 47),
    ]]
    fillet(fillet3_edges, radius=FILLET3_R)


solid = part.part
